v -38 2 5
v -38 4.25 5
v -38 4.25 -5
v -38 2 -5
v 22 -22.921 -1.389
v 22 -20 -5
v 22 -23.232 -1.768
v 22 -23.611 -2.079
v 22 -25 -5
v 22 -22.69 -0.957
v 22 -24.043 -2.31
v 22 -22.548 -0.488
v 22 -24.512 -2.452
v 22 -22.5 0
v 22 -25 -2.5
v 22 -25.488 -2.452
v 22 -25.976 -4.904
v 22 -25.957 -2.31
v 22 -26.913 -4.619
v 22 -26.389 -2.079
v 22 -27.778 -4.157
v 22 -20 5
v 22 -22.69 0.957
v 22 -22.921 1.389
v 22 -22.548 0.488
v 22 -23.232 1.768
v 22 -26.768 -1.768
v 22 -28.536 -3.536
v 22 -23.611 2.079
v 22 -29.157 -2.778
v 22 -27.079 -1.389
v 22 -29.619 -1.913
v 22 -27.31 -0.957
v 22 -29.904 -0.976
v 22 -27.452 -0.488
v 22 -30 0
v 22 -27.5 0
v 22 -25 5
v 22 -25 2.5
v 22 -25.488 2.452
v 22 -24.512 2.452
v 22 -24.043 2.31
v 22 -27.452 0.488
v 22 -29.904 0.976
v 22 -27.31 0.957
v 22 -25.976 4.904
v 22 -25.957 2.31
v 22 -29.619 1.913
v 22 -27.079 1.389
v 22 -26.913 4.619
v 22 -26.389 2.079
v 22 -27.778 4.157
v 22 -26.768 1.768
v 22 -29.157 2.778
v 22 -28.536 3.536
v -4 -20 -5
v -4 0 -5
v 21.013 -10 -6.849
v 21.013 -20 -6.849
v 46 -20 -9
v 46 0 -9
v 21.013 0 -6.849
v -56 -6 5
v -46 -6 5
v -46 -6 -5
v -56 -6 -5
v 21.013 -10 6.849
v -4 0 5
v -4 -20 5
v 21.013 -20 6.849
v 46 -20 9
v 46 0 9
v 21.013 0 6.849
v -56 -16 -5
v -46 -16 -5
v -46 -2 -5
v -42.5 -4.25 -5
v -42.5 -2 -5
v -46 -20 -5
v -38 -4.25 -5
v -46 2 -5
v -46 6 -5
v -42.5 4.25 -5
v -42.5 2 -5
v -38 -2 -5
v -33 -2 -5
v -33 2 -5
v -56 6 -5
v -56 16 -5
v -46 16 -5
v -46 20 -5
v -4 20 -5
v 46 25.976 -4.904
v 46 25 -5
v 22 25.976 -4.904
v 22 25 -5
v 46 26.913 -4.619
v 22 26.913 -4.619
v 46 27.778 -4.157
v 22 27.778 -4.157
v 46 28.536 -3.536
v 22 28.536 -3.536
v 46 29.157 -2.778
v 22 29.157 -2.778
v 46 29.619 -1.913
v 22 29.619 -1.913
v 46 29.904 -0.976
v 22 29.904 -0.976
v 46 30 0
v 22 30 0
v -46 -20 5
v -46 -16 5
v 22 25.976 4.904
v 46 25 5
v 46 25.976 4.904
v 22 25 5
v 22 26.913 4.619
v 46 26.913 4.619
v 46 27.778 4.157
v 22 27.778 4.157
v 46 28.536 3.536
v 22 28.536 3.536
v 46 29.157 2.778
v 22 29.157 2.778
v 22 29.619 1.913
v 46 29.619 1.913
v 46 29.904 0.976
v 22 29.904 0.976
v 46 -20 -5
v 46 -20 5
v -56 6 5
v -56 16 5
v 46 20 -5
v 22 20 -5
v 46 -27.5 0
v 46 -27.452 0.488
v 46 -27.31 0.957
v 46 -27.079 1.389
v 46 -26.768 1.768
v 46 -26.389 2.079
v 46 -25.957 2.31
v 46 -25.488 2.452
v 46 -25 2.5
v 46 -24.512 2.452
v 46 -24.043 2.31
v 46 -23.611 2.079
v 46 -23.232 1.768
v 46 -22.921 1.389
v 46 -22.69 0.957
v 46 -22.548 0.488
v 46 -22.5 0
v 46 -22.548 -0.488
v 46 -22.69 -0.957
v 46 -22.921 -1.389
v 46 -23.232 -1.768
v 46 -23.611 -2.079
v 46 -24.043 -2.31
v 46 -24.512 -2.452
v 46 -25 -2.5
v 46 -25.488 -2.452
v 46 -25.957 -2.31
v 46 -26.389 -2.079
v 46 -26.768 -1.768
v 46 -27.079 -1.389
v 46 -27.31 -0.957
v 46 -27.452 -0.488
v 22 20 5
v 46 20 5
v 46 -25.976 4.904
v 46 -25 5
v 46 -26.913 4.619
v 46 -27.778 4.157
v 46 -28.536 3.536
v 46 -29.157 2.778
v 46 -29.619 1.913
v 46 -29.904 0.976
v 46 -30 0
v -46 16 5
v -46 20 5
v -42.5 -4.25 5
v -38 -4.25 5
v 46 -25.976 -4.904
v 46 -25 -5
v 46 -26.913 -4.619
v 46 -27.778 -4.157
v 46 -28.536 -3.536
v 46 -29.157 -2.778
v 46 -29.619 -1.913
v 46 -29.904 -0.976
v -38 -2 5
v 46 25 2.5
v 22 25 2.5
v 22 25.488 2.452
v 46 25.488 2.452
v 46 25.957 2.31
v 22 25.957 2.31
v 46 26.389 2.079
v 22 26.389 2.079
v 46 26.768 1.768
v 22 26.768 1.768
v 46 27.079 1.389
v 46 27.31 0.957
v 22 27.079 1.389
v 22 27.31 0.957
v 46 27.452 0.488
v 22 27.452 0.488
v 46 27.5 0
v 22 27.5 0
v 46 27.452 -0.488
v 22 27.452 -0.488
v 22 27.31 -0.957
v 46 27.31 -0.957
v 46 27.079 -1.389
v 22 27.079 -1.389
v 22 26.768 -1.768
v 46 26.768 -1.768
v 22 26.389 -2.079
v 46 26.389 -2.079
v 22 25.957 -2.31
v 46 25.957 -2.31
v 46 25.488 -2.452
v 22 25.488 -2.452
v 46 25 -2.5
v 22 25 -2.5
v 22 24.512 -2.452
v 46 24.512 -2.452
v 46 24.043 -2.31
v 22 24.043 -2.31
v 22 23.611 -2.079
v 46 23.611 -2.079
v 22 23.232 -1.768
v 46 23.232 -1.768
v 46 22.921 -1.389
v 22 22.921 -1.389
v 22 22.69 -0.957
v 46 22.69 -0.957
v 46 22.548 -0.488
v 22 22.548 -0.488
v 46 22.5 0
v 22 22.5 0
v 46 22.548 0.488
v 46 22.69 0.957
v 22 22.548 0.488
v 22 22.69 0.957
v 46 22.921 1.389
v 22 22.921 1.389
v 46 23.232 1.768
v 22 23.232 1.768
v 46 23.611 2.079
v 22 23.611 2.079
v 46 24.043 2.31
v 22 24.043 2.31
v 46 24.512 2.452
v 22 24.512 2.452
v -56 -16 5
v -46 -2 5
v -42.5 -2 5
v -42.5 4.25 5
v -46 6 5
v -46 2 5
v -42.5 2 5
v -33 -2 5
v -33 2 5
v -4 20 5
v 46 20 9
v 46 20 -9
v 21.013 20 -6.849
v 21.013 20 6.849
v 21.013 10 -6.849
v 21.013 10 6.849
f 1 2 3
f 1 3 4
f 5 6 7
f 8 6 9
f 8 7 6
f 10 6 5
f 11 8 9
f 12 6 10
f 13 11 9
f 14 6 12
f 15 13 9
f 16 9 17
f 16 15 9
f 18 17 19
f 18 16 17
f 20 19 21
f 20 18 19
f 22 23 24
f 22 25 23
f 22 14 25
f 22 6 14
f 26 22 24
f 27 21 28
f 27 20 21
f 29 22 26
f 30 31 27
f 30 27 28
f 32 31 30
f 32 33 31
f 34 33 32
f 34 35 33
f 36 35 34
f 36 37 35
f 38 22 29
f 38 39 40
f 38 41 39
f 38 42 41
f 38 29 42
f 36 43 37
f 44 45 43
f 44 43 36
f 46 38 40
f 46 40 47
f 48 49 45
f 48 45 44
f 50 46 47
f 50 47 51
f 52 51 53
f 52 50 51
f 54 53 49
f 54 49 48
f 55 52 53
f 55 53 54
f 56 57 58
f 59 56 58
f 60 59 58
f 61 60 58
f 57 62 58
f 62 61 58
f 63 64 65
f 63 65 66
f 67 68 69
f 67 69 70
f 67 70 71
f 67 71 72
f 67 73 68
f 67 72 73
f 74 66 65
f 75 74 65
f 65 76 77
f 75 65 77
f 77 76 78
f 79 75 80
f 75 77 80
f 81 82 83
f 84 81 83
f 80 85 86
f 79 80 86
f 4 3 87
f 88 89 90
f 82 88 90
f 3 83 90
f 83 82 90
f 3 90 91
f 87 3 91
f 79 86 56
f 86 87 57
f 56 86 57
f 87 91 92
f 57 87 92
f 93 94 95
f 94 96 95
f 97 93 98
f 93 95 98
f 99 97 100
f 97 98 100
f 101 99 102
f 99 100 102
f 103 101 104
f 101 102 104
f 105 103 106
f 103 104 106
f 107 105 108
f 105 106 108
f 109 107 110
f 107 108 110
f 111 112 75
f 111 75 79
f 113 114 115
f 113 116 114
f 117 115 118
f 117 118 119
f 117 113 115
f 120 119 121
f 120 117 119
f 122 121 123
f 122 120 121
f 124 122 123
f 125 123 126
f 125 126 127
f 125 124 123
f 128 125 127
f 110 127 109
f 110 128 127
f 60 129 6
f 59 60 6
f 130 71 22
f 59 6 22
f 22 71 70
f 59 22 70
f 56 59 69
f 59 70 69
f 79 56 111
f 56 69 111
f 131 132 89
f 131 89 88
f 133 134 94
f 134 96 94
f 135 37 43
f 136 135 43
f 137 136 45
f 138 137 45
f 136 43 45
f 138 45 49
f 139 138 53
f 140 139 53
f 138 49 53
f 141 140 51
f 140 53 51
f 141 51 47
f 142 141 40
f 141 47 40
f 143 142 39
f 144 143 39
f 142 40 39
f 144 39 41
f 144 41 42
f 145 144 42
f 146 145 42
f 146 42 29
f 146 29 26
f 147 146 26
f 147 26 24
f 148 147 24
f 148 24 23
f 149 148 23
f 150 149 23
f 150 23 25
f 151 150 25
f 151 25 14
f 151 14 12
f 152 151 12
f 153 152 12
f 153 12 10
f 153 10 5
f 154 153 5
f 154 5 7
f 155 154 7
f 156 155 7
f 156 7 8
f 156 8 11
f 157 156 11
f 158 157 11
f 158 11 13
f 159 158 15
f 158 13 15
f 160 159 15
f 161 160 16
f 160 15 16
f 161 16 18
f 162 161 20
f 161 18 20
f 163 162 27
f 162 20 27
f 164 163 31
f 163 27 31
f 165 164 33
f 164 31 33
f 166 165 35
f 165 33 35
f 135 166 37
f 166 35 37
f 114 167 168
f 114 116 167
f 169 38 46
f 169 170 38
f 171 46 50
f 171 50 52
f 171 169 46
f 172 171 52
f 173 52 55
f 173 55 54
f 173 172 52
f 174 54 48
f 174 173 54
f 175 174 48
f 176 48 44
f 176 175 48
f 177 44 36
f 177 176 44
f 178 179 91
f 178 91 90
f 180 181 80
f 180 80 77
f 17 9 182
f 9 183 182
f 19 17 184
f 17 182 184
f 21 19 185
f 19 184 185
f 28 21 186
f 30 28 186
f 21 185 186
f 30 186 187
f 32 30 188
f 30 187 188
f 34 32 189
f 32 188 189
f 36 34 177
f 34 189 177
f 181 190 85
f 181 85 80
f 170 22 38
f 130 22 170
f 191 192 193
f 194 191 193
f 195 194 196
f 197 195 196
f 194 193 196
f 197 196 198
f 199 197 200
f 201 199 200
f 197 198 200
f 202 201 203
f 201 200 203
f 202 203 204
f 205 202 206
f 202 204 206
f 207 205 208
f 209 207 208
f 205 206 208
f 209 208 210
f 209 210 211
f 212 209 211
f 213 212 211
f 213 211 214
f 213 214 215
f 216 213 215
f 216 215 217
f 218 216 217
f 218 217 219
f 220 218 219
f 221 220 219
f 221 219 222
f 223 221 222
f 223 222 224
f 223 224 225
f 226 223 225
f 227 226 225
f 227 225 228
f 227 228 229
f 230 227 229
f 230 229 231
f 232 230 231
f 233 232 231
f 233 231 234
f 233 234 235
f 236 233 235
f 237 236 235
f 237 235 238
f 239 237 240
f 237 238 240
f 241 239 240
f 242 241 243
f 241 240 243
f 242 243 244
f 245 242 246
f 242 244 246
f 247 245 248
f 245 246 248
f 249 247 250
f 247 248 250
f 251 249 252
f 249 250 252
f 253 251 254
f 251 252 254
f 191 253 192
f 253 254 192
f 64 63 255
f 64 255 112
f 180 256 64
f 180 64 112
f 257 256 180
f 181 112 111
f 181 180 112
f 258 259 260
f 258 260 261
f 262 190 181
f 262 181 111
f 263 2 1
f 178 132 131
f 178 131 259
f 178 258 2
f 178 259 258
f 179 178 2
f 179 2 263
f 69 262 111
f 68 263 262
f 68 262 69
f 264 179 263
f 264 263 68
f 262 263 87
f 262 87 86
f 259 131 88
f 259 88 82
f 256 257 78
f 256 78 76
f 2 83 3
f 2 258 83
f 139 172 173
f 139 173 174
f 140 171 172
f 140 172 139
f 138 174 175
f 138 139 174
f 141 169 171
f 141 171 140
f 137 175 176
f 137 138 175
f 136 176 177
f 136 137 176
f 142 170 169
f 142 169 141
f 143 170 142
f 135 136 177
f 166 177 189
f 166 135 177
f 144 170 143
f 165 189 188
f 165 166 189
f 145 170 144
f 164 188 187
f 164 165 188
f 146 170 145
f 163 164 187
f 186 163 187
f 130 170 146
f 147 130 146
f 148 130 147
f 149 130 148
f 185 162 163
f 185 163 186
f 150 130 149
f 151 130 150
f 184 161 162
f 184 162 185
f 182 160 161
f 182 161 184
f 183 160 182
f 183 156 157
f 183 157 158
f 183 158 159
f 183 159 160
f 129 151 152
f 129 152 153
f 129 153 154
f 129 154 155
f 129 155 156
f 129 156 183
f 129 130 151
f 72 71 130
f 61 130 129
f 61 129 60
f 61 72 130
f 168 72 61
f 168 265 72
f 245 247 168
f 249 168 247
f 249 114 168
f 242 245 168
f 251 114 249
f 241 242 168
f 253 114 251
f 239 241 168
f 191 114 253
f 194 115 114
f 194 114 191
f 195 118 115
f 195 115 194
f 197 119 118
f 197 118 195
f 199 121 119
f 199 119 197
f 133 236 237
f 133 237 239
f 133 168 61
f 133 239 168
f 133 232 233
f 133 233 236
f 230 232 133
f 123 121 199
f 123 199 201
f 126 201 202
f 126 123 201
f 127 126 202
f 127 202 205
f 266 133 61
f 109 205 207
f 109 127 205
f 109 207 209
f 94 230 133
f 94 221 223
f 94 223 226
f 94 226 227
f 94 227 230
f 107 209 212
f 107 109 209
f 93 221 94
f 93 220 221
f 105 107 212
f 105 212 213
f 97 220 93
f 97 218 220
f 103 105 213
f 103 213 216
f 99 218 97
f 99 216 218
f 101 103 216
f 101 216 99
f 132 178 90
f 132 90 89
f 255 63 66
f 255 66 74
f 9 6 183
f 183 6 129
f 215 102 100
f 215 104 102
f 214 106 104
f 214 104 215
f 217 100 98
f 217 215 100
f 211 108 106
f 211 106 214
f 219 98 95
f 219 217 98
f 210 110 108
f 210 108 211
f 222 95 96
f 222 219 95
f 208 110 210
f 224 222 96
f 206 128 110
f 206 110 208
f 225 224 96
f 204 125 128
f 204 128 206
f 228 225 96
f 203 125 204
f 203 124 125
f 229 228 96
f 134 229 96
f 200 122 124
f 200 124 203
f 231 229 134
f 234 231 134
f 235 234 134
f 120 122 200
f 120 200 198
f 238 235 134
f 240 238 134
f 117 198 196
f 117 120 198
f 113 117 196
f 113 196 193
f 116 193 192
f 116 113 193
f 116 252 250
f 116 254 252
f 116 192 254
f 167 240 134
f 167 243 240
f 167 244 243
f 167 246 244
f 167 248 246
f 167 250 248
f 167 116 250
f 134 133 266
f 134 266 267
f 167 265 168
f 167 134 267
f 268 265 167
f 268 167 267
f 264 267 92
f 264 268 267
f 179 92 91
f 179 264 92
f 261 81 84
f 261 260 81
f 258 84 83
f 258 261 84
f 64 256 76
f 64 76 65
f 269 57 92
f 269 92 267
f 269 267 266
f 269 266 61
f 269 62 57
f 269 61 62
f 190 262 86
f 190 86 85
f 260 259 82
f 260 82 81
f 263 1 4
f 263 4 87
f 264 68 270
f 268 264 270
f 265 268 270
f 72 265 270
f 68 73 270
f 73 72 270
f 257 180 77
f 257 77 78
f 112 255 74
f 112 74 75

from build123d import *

# Parameters (mm, degrees)
BOSS_EXTRUDE1_DEPTH         = 5
SKETCH2_R                   = 2.5
CUT_EXTRUDE1_DEPTH          = 84.719770664
SKETCH3_R                   = 2.5
CUT_EXTRUDE2_DEPTH          = 84.719770664
FILLET1_R                   = 5
Y_KSEKLIK_EKSTR_ZYON1_DEPTH = 20


with BuildPart() as part:
    # Sketch1 → Boss-Extrude1 (new, symmetric)
    with BuildSketch(Plane.XY):
        Polygon((-42.5, 4.25), (-38, 4.25), (-38, 2), (-33, 2), (-33, -2), (-38, -2), (-38, -4.25), (-42.5, -4.25), (-42.5, -2), (-46, -2), (-46, -6), (-56, -6), (-56, -16), (-46, -16), (-46, -20), (22, -20), (22, -30), (46, -30), (46, -20), (46, -16), (46, -6), (46, -2), (46, 2), (46, 6), (46, 16), (46, 20), (46, 30), (22, 30), (22, 20), (-46, 20), (-46, 16), (-56, 16), (-56, 6), (-46, 6), (-46, 2), (-42.5, 2), align=None)
    extrude(amount=BOSS_EXTRUDE1_DEPTH, both=True)

    # Sketch2 → Cut-Extrude1 (cut, through all)
    with BuildSketch(Plane.ZY.offset(-22)):
        with Locations(Location((0, -25, 0), (0, 0, 270))):
            Circle(SKETCH2_R)
    extrude(amount=-CUT_EXTRUDE1_DEPTH, mode=Mode.SUBTRACT)

    # Sketch3 → Cut-Extrude2 (cut, through all)
    with BuildSketch(Plane.ZY.offset(-22)):
        with Locations((0, 25)):
            Circle(SKETCH3_R)
    extrude(amount=-CUT_EXTRUDE2_DEPTH, mode=Mode.SUBTRACT)

    # Fillet1
    fillet1_edges = [part.edges().sort_by_distance(p)[0] for p in [
        (34, -30, 5),
        (34, -30, -5),
        (34, 30, 5),
        (34, 30, -5),
    ]]
    fillet(fillet1_edges, radius=FILLET1_R - 0.0001)  # a hair under: the kernel refuses the full size

    # Çizim2 → Yükseklik-Ekstrüzyon1 (add, symmetric)
    with BuildSketch(Plane(origin=(0, 0, 0), x_dir=(1, 0, 0), z_dir=(0, 1, 0))):
        with BuildLine():
            Line((46, 5), (-4, 5))
            add(Edge.make_bspline(
                [(-4, 5), (21.025086812, 6.697636519), (46, 9)],
                knots=[0, 0, 0, 1, 1, 1], degree=2))
            Line((46, 9), (46, 5))
        make_face()
    y_kseklik_ekstr_zyon1 = extrude(amount=Y_KSEKLIK_EKSTR_ZYON1_DEPTH, both=True)

    # Mirror1: Yükseklik-Ekstrüzyon1 across plane
    add(y_kseklik_ekstr_zyon1.mirror(Plane.XY))


solid = part.part
